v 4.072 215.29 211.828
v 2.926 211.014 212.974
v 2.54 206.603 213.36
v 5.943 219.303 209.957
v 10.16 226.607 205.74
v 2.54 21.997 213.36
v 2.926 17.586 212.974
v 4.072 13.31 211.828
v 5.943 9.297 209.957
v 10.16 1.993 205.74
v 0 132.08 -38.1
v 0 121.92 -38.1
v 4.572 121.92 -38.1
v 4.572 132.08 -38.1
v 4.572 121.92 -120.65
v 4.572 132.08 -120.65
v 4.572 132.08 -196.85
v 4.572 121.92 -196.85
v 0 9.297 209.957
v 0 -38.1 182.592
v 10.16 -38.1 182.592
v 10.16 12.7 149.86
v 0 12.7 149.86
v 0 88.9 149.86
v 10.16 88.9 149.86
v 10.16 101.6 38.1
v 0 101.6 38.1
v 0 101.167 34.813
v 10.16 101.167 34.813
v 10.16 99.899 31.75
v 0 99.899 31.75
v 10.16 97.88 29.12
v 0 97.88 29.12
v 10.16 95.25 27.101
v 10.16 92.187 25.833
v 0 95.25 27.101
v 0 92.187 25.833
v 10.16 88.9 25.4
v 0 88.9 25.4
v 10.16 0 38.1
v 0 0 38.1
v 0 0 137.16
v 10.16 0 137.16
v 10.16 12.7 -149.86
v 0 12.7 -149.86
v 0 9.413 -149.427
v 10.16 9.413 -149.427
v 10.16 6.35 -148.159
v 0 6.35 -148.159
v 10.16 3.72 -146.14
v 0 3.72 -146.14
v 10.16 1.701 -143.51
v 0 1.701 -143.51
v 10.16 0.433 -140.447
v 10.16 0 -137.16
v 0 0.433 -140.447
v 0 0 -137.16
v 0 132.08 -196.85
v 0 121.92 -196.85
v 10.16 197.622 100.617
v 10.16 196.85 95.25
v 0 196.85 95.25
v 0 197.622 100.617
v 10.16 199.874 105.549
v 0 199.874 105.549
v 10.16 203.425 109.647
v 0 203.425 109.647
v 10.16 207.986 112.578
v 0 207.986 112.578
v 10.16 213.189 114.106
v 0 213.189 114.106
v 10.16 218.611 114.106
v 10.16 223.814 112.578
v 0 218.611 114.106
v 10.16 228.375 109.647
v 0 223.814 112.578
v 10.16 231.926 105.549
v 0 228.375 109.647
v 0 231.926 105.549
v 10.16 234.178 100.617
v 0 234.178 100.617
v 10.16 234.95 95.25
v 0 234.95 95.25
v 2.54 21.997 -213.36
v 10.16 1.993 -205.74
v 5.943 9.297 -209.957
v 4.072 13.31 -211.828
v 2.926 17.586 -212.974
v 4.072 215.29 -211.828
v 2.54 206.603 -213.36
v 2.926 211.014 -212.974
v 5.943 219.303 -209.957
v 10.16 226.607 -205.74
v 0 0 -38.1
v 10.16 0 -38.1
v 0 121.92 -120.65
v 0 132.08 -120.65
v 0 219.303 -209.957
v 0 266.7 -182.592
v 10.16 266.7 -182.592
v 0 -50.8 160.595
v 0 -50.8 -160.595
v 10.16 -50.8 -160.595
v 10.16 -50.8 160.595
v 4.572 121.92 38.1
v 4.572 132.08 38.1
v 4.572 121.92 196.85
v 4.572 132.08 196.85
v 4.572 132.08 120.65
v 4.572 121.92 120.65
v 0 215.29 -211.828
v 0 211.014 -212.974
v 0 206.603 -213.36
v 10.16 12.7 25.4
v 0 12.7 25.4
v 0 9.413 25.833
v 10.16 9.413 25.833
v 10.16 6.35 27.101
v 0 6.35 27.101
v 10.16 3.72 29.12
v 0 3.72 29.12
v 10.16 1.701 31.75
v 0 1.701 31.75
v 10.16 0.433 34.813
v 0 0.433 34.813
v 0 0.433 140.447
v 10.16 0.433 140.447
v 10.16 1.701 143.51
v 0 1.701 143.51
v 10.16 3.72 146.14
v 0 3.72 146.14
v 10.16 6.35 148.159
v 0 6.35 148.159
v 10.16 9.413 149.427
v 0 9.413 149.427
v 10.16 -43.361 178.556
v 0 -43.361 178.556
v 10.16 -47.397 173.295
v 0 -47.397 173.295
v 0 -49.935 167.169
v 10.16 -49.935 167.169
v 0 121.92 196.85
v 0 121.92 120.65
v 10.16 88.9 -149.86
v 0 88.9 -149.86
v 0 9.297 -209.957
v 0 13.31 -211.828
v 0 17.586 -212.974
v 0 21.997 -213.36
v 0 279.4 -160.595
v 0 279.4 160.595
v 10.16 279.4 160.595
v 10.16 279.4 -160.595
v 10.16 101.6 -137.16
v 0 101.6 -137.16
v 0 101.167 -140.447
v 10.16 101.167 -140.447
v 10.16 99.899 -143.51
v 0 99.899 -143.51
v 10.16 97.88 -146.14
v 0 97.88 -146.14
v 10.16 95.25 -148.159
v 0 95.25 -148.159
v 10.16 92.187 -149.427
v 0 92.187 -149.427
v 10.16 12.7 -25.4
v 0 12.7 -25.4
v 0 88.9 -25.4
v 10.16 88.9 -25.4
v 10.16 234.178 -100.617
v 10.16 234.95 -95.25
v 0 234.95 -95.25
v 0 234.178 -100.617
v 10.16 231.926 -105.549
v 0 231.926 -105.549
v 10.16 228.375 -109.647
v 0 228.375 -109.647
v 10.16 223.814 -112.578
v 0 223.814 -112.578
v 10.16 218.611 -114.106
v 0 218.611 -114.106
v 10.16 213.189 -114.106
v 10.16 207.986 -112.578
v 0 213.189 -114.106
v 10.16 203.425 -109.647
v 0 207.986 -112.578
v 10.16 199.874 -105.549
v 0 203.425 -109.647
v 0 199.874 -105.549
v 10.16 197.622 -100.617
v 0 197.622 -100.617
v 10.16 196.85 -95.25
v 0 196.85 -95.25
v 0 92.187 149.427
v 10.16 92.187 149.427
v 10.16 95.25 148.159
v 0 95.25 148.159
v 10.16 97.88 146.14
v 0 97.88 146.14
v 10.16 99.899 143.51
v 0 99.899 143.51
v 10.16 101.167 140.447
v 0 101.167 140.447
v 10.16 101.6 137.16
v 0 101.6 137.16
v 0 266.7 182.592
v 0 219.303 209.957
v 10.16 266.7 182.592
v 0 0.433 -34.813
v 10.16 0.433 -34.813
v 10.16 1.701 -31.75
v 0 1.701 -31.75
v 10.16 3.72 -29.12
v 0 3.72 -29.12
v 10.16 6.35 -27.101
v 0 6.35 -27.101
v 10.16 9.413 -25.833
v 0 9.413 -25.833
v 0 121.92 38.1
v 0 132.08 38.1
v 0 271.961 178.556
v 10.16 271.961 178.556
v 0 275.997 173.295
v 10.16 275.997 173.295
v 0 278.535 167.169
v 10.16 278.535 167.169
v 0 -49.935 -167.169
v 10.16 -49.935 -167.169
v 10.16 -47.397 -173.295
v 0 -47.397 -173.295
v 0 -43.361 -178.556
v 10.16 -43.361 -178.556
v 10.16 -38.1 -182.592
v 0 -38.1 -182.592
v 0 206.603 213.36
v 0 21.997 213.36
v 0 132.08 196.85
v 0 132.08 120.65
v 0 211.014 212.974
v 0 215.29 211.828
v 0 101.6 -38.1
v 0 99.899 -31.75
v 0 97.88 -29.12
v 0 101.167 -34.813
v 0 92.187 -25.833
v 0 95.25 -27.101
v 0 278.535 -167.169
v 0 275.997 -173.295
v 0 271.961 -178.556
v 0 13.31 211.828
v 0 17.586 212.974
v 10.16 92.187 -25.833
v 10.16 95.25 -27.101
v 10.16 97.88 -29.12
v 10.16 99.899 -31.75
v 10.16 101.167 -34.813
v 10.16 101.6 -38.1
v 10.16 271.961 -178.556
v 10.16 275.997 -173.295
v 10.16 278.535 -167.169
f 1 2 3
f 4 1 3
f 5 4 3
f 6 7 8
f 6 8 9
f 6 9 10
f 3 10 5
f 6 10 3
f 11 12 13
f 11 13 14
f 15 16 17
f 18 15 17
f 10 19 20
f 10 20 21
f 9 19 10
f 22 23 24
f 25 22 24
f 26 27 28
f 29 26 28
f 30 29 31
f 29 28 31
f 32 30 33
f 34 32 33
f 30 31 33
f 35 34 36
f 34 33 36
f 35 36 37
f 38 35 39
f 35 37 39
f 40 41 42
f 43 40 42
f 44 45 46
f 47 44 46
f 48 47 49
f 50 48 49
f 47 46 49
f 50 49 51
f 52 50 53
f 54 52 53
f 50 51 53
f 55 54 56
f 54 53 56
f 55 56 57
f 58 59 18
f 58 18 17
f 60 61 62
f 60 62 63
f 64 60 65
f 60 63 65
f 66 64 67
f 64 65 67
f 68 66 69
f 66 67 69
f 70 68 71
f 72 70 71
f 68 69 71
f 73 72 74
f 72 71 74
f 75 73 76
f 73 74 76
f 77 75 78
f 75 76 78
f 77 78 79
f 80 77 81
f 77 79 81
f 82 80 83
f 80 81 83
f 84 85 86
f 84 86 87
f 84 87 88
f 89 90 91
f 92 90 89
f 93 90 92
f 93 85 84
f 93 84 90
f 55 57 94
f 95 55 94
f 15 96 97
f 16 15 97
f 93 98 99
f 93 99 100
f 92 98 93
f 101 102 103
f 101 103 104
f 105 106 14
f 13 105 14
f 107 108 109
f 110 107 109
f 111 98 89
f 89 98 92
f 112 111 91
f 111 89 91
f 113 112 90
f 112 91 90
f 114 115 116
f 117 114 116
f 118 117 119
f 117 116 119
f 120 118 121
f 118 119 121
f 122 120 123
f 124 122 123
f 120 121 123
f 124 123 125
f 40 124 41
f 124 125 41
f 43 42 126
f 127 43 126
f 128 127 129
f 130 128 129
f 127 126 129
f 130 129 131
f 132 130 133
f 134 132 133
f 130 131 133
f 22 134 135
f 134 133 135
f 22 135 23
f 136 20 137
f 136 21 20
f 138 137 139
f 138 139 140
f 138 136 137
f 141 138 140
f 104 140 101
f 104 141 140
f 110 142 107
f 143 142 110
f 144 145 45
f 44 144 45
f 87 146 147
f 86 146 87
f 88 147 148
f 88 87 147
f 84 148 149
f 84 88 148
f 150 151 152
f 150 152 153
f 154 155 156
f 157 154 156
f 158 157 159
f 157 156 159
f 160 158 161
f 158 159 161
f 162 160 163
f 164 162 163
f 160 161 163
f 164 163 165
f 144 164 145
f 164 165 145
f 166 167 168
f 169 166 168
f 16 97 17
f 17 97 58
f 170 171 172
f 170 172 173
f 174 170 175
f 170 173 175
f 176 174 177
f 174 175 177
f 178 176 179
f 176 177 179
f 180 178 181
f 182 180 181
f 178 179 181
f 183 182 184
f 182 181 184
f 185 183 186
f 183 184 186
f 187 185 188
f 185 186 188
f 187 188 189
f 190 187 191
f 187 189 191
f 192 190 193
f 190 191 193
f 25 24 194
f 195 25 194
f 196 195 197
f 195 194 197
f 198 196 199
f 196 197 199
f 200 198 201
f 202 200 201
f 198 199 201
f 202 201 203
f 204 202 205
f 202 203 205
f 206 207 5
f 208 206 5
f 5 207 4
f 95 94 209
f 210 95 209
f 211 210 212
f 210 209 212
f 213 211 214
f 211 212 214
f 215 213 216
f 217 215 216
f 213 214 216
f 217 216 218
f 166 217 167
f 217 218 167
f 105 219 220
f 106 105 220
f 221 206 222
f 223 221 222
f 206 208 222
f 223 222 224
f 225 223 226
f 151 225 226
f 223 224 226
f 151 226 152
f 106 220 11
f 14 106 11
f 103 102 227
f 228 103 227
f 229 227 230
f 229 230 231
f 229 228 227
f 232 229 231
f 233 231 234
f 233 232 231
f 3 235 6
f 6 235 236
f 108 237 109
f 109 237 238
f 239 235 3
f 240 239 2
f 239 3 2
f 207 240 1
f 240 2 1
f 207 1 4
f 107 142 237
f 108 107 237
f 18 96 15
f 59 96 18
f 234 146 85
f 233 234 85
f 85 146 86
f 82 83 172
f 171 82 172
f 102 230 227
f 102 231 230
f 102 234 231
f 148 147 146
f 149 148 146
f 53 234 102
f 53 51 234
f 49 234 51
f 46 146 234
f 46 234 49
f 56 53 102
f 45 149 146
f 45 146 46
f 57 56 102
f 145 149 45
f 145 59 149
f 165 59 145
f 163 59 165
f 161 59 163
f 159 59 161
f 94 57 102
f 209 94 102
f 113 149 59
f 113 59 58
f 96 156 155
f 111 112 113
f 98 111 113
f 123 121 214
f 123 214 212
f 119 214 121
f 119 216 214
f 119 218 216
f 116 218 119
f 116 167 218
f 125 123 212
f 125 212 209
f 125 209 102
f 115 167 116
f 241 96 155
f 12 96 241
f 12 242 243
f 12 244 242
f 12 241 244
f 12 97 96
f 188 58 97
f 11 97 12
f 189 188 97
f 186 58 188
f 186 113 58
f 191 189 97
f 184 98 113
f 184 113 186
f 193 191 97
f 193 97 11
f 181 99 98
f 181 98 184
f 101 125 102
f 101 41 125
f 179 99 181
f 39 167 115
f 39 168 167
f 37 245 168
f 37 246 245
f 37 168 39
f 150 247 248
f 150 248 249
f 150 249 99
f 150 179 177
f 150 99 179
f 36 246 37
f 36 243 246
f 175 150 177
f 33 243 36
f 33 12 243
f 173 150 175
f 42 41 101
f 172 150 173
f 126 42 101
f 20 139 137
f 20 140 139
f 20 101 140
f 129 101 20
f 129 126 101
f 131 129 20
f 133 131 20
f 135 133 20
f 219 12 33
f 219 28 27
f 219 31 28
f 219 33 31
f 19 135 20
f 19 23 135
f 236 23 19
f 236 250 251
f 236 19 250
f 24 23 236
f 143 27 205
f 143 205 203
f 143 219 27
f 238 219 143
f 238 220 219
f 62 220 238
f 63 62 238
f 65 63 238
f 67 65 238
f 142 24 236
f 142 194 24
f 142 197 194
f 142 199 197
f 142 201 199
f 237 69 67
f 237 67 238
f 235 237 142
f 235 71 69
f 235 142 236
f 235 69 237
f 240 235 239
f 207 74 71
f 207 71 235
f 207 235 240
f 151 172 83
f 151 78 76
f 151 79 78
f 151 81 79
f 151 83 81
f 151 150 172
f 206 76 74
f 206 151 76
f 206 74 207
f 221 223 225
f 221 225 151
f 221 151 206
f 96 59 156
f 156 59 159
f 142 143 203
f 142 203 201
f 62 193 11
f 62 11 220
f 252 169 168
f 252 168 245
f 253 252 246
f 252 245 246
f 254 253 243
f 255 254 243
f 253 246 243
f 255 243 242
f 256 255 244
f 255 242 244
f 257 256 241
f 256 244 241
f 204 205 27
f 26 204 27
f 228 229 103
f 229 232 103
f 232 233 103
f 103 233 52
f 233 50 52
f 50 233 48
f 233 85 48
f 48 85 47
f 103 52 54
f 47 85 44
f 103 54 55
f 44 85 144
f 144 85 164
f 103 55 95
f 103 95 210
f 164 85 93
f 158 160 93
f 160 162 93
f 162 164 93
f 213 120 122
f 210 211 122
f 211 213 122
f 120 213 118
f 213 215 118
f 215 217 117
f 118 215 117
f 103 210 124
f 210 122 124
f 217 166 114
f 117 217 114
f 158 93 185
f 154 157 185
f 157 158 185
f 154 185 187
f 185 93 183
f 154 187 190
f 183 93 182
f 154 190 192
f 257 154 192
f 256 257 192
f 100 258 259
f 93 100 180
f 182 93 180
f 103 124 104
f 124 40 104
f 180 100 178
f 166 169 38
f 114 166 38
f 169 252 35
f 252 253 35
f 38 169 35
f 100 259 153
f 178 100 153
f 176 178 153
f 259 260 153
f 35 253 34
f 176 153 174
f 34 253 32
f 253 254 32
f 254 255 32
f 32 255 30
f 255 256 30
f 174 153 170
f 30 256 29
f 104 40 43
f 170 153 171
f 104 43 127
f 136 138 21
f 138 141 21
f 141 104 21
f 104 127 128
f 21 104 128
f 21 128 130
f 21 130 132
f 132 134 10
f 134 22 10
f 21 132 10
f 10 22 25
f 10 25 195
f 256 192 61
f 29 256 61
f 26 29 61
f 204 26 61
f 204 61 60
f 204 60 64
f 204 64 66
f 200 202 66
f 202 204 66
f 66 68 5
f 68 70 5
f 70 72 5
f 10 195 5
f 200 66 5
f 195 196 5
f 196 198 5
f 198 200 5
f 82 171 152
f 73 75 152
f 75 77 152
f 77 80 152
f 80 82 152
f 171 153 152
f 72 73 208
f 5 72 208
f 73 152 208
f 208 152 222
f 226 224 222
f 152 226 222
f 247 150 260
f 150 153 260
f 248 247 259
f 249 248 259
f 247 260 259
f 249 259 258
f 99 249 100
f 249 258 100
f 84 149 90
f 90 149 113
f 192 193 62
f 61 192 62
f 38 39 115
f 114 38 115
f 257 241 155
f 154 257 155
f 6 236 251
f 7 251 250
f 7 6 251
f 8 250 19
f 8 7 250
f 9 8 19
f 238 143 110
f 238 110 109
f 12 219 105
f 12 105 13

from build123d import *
from OCP.BRepFilletAPI import BRepFilletAPI_MakeChamfer

# Parameters (mm, degrees)
BOSS_EXTRUDE1_DEPTH = 10.16
SKETCH2_W           = 76.2
SKETCH2_H           = 10.16
CUT_EXTRUDE1_DEPTH  = 4.572
CHAMFER1_SIZE       = 38.1
CHAMFER1_SIZE2      = 65.991135768
FILLET1_R           = 25.4


with BuildPart() as part:
    # Sketch1 → Boss-Extrude1 (new body)
    with BuildSketch(Plane(origin=(0, 0, 0), x_dir=(0, 0, -1), z_dir=(1, 0, 0))):
        Polygon((-213.36, 0), (-213.36, 254), (-213.36, 279.4), (213.36, 279.4), (213.36, 254), (213.36, 0), (213.36, -50.8), (-213.36, -50.8), align=None)
        with BuildLine():
            Line((-95.25, 234.95), (95.25, 234.95))
            ThreePointArc((95.25, 234.95), (114.3, 215.9), (95.25, 196.85))
            Line((95.25, 196.85), (-95.25, 196.85))
            ThreePointArc((-95.25, 196.85), (-114.3, 215.9), (-95.25, 234.95))
        make_face(mode=Mode.SUBTRACT)
        with BuildLine():
            Line((38.1, 101.6), (137.16, 101.6))
            ThreePointArc((137.16, 101.6), (146.140256121, 97.880256121), (149.86, 88.9))
            Line((149.86, 88.9), (149.86, 12.7))
            ThreePointArc((149.86, 12.7), (146.140256121, 3.719743879), (137.16, 0))
            Line((137.16, 0), (38.1, 0))
            ThreePointArc((38.1, 0), (29.119743879, 3.719743879), (25.4, 12.7))
            Line((25.4, 12.7), (25.4, 88.9))
            ThreePointArc((25.4, 88.9), (29.119743879, 97.880256121), (38.1, 101.6))
        make_face(mode=Mode.SUBTRACT)
        with BuildLine():
            Line((-38.1, 0), (-137.16, 0))
            ThreePointArc((-137.16, 0), (-146.140256121, 3.719743879), (-149.86, 12.7))
            Line((-149.86, 12.7), (-149.86, 88.9))
            ThreePointArc((-149.86, 88.9), (-146.140256121, 97.880256121), (-137.16, 101.6))
            Line((-137.16, 101.6), (-38.1, 101.6))
            ThreePointArc((-38.1, 101.6), (-29.119743879, 97.880256121), (-25.4, 88.9))
            Line((-25.4, 88.9), (-25.4, 12.7))
            ThreePointArc((-25.4, 12.7), (-29.119743879, 3.719743879), (-38.1, 0))
        make_face(mode=Mode.SUBTRACT)
    extrude(amount=BOSS_EXTRUDE1_DEPTH)

    # Sketch2 → Cut-Extrude1 (cut)
    with BuildSketch(Plane(origin=(0, 0, 0), x_dir=(0, 0, -1), z_dir=(1, 0, 0))):
        with Locations((-158.75, 127)):
            Rectangle(SKETCH2_W, SKETCH2_H)
        with Locations((0, 127)):
            Rectangle(SKETCH2_W, SKETCH2_H)
        with Locations((158.75, 127)):
            Rectangle(SKETCH2_W, SKETCH2_H)
    extrude(amount=CUT_EXTRUDE1_DEPTH, mode=Mode.SUBTRACT)

    # Chamfer1: one chamfer whose edges measure the first distance from different faces: ONE call of the kernel's chamfer builder (chamfer() names one face for all edges)
    chamfer1_edges_1 = [part.edges().sort_by_distance(p)[0] for p in [
        (5.08, 279.4, 213.36),
        (5.08, 279.4, -213.36),
    ]]
    chamfer1_side_1 = [part.faces().sort_by_distance(p)[0] for p in [
        (5.08, 279.4, 0),
    ]]
    chamfer1_edges_2 = [part.edges().sort_by_distance(p)[0] for p in [
        (5.08, -50.8, -213.36),
        (5.08, -50.8, 213.36),
    ]]
    chamfer1_side_2 = [part.faces().sort_by_distance(p)[0] for p in [
        (5.08, -50.8, 0),
    ]]
    chamfer1 = BRepFilletAPI_MakeChamfer(part.part.solid().wrapped)
    for e in chamfer1_edges_1:
        chamfer1.Add(CHAMFER1_SIZE, CHAMFER1_SIZE2, e.wrapped, chamfer1_side_1[0].wrapped)  # the first distance lies on this face
    for e in chamfer1_edges_2:
        chamfer1.Add(CHAMFER1_SIZE, CHAMFER1_SIZE2, e.wrapped, chamfer1_side_2[0].wrapped)  # the first distance lies on this face
    add(Compound.cast(chamfer1.Shape()), mode=Mode.REPLACE)

    # Fillet1
    fillet1_edges = [part.edges().sort_by_distance(p)[0] for p in [
        (5.08, 15.191135768, 213.36),
        (5.08, 213.408864232, 213.36),
        (5.08, 279.4, -175.26),
        (5.08, 279.4, 175.26),
        (5.08, 15.191135768, -213.36),
        (5.08, 213.408864232, -213.36),
        (5.08, -50.8, -175.26),
        (5.08, -50.8, 175.26),
    ]]
    fillet(fillet1_edges, radius=FILLET1_R)

    # Chamfer2
    # the kernel refuses this chamfer: 7.62 mm, written as the material it takes off along each edge
    with BuildSketch(Plane(origin=(10.16, 253.633893228, -213.36), x_dir=(0.02749587661058636, 0, 0.9996219169112968), z_dir=(0, -1, 0))) as chamfer2_piece_1:
        with BuildLine():
            Line((7.838489747, 0), (-0.43088932, 7.826637587))
            Line((-0.43088932, 7.826637587), (-0.5832317, 7.822447215))
            ThreePointArc((-0.5832317, 7.822447215), (-0.26006471, 3.912091462), (-0.15234238, -0.004190372))
            Line((-0.15234238, -0.004190372), (0.004190372, -0.15234238))
            ThreePointArc((0.004190372, -0.15234238), (3.920472205, -0.04462005), (7.842680119, -0.15234238))
            Line((7.842680119, -0.15234238), (7.838489747, 0))
        make_face()
    extrude(amount=278.667786456, mode=Mode.SUBTRACT)
    with BuildSketch(Plane(origin=(10.16, -25.033893228, 213.36), x_dir=(-0.9996219169112968, 0, 0.027495876610586382), z_dir=(0, 1, 0))) as chamfer2_piece_2:
        with BuildLine():
            Line((7.838489747, 0), (-0.43088932, -7.826637587))
            Line((-0.43088932, -7.826637587), (-0.5832317, -7.822447215))
            ThreePointArc((-0.5832317, -7.822447215), (-0.26006471, -3.912091462), (-0.15234238, 0.004190372))
            Line((-0.15234238, 0.004190372), (0.004190372, 0.15234238))
            ThreePointArc((0.004190372, 0.15234238), (3.920472205, 0.04462005), (7.842680119, 0.15234238))
            Line((7.842680119, 0.15234238), (7.838489747, 0))
        make_face()
    extrude(amount=278.667786456, mode=Mode.SUBTRACT)


solid = part.part
